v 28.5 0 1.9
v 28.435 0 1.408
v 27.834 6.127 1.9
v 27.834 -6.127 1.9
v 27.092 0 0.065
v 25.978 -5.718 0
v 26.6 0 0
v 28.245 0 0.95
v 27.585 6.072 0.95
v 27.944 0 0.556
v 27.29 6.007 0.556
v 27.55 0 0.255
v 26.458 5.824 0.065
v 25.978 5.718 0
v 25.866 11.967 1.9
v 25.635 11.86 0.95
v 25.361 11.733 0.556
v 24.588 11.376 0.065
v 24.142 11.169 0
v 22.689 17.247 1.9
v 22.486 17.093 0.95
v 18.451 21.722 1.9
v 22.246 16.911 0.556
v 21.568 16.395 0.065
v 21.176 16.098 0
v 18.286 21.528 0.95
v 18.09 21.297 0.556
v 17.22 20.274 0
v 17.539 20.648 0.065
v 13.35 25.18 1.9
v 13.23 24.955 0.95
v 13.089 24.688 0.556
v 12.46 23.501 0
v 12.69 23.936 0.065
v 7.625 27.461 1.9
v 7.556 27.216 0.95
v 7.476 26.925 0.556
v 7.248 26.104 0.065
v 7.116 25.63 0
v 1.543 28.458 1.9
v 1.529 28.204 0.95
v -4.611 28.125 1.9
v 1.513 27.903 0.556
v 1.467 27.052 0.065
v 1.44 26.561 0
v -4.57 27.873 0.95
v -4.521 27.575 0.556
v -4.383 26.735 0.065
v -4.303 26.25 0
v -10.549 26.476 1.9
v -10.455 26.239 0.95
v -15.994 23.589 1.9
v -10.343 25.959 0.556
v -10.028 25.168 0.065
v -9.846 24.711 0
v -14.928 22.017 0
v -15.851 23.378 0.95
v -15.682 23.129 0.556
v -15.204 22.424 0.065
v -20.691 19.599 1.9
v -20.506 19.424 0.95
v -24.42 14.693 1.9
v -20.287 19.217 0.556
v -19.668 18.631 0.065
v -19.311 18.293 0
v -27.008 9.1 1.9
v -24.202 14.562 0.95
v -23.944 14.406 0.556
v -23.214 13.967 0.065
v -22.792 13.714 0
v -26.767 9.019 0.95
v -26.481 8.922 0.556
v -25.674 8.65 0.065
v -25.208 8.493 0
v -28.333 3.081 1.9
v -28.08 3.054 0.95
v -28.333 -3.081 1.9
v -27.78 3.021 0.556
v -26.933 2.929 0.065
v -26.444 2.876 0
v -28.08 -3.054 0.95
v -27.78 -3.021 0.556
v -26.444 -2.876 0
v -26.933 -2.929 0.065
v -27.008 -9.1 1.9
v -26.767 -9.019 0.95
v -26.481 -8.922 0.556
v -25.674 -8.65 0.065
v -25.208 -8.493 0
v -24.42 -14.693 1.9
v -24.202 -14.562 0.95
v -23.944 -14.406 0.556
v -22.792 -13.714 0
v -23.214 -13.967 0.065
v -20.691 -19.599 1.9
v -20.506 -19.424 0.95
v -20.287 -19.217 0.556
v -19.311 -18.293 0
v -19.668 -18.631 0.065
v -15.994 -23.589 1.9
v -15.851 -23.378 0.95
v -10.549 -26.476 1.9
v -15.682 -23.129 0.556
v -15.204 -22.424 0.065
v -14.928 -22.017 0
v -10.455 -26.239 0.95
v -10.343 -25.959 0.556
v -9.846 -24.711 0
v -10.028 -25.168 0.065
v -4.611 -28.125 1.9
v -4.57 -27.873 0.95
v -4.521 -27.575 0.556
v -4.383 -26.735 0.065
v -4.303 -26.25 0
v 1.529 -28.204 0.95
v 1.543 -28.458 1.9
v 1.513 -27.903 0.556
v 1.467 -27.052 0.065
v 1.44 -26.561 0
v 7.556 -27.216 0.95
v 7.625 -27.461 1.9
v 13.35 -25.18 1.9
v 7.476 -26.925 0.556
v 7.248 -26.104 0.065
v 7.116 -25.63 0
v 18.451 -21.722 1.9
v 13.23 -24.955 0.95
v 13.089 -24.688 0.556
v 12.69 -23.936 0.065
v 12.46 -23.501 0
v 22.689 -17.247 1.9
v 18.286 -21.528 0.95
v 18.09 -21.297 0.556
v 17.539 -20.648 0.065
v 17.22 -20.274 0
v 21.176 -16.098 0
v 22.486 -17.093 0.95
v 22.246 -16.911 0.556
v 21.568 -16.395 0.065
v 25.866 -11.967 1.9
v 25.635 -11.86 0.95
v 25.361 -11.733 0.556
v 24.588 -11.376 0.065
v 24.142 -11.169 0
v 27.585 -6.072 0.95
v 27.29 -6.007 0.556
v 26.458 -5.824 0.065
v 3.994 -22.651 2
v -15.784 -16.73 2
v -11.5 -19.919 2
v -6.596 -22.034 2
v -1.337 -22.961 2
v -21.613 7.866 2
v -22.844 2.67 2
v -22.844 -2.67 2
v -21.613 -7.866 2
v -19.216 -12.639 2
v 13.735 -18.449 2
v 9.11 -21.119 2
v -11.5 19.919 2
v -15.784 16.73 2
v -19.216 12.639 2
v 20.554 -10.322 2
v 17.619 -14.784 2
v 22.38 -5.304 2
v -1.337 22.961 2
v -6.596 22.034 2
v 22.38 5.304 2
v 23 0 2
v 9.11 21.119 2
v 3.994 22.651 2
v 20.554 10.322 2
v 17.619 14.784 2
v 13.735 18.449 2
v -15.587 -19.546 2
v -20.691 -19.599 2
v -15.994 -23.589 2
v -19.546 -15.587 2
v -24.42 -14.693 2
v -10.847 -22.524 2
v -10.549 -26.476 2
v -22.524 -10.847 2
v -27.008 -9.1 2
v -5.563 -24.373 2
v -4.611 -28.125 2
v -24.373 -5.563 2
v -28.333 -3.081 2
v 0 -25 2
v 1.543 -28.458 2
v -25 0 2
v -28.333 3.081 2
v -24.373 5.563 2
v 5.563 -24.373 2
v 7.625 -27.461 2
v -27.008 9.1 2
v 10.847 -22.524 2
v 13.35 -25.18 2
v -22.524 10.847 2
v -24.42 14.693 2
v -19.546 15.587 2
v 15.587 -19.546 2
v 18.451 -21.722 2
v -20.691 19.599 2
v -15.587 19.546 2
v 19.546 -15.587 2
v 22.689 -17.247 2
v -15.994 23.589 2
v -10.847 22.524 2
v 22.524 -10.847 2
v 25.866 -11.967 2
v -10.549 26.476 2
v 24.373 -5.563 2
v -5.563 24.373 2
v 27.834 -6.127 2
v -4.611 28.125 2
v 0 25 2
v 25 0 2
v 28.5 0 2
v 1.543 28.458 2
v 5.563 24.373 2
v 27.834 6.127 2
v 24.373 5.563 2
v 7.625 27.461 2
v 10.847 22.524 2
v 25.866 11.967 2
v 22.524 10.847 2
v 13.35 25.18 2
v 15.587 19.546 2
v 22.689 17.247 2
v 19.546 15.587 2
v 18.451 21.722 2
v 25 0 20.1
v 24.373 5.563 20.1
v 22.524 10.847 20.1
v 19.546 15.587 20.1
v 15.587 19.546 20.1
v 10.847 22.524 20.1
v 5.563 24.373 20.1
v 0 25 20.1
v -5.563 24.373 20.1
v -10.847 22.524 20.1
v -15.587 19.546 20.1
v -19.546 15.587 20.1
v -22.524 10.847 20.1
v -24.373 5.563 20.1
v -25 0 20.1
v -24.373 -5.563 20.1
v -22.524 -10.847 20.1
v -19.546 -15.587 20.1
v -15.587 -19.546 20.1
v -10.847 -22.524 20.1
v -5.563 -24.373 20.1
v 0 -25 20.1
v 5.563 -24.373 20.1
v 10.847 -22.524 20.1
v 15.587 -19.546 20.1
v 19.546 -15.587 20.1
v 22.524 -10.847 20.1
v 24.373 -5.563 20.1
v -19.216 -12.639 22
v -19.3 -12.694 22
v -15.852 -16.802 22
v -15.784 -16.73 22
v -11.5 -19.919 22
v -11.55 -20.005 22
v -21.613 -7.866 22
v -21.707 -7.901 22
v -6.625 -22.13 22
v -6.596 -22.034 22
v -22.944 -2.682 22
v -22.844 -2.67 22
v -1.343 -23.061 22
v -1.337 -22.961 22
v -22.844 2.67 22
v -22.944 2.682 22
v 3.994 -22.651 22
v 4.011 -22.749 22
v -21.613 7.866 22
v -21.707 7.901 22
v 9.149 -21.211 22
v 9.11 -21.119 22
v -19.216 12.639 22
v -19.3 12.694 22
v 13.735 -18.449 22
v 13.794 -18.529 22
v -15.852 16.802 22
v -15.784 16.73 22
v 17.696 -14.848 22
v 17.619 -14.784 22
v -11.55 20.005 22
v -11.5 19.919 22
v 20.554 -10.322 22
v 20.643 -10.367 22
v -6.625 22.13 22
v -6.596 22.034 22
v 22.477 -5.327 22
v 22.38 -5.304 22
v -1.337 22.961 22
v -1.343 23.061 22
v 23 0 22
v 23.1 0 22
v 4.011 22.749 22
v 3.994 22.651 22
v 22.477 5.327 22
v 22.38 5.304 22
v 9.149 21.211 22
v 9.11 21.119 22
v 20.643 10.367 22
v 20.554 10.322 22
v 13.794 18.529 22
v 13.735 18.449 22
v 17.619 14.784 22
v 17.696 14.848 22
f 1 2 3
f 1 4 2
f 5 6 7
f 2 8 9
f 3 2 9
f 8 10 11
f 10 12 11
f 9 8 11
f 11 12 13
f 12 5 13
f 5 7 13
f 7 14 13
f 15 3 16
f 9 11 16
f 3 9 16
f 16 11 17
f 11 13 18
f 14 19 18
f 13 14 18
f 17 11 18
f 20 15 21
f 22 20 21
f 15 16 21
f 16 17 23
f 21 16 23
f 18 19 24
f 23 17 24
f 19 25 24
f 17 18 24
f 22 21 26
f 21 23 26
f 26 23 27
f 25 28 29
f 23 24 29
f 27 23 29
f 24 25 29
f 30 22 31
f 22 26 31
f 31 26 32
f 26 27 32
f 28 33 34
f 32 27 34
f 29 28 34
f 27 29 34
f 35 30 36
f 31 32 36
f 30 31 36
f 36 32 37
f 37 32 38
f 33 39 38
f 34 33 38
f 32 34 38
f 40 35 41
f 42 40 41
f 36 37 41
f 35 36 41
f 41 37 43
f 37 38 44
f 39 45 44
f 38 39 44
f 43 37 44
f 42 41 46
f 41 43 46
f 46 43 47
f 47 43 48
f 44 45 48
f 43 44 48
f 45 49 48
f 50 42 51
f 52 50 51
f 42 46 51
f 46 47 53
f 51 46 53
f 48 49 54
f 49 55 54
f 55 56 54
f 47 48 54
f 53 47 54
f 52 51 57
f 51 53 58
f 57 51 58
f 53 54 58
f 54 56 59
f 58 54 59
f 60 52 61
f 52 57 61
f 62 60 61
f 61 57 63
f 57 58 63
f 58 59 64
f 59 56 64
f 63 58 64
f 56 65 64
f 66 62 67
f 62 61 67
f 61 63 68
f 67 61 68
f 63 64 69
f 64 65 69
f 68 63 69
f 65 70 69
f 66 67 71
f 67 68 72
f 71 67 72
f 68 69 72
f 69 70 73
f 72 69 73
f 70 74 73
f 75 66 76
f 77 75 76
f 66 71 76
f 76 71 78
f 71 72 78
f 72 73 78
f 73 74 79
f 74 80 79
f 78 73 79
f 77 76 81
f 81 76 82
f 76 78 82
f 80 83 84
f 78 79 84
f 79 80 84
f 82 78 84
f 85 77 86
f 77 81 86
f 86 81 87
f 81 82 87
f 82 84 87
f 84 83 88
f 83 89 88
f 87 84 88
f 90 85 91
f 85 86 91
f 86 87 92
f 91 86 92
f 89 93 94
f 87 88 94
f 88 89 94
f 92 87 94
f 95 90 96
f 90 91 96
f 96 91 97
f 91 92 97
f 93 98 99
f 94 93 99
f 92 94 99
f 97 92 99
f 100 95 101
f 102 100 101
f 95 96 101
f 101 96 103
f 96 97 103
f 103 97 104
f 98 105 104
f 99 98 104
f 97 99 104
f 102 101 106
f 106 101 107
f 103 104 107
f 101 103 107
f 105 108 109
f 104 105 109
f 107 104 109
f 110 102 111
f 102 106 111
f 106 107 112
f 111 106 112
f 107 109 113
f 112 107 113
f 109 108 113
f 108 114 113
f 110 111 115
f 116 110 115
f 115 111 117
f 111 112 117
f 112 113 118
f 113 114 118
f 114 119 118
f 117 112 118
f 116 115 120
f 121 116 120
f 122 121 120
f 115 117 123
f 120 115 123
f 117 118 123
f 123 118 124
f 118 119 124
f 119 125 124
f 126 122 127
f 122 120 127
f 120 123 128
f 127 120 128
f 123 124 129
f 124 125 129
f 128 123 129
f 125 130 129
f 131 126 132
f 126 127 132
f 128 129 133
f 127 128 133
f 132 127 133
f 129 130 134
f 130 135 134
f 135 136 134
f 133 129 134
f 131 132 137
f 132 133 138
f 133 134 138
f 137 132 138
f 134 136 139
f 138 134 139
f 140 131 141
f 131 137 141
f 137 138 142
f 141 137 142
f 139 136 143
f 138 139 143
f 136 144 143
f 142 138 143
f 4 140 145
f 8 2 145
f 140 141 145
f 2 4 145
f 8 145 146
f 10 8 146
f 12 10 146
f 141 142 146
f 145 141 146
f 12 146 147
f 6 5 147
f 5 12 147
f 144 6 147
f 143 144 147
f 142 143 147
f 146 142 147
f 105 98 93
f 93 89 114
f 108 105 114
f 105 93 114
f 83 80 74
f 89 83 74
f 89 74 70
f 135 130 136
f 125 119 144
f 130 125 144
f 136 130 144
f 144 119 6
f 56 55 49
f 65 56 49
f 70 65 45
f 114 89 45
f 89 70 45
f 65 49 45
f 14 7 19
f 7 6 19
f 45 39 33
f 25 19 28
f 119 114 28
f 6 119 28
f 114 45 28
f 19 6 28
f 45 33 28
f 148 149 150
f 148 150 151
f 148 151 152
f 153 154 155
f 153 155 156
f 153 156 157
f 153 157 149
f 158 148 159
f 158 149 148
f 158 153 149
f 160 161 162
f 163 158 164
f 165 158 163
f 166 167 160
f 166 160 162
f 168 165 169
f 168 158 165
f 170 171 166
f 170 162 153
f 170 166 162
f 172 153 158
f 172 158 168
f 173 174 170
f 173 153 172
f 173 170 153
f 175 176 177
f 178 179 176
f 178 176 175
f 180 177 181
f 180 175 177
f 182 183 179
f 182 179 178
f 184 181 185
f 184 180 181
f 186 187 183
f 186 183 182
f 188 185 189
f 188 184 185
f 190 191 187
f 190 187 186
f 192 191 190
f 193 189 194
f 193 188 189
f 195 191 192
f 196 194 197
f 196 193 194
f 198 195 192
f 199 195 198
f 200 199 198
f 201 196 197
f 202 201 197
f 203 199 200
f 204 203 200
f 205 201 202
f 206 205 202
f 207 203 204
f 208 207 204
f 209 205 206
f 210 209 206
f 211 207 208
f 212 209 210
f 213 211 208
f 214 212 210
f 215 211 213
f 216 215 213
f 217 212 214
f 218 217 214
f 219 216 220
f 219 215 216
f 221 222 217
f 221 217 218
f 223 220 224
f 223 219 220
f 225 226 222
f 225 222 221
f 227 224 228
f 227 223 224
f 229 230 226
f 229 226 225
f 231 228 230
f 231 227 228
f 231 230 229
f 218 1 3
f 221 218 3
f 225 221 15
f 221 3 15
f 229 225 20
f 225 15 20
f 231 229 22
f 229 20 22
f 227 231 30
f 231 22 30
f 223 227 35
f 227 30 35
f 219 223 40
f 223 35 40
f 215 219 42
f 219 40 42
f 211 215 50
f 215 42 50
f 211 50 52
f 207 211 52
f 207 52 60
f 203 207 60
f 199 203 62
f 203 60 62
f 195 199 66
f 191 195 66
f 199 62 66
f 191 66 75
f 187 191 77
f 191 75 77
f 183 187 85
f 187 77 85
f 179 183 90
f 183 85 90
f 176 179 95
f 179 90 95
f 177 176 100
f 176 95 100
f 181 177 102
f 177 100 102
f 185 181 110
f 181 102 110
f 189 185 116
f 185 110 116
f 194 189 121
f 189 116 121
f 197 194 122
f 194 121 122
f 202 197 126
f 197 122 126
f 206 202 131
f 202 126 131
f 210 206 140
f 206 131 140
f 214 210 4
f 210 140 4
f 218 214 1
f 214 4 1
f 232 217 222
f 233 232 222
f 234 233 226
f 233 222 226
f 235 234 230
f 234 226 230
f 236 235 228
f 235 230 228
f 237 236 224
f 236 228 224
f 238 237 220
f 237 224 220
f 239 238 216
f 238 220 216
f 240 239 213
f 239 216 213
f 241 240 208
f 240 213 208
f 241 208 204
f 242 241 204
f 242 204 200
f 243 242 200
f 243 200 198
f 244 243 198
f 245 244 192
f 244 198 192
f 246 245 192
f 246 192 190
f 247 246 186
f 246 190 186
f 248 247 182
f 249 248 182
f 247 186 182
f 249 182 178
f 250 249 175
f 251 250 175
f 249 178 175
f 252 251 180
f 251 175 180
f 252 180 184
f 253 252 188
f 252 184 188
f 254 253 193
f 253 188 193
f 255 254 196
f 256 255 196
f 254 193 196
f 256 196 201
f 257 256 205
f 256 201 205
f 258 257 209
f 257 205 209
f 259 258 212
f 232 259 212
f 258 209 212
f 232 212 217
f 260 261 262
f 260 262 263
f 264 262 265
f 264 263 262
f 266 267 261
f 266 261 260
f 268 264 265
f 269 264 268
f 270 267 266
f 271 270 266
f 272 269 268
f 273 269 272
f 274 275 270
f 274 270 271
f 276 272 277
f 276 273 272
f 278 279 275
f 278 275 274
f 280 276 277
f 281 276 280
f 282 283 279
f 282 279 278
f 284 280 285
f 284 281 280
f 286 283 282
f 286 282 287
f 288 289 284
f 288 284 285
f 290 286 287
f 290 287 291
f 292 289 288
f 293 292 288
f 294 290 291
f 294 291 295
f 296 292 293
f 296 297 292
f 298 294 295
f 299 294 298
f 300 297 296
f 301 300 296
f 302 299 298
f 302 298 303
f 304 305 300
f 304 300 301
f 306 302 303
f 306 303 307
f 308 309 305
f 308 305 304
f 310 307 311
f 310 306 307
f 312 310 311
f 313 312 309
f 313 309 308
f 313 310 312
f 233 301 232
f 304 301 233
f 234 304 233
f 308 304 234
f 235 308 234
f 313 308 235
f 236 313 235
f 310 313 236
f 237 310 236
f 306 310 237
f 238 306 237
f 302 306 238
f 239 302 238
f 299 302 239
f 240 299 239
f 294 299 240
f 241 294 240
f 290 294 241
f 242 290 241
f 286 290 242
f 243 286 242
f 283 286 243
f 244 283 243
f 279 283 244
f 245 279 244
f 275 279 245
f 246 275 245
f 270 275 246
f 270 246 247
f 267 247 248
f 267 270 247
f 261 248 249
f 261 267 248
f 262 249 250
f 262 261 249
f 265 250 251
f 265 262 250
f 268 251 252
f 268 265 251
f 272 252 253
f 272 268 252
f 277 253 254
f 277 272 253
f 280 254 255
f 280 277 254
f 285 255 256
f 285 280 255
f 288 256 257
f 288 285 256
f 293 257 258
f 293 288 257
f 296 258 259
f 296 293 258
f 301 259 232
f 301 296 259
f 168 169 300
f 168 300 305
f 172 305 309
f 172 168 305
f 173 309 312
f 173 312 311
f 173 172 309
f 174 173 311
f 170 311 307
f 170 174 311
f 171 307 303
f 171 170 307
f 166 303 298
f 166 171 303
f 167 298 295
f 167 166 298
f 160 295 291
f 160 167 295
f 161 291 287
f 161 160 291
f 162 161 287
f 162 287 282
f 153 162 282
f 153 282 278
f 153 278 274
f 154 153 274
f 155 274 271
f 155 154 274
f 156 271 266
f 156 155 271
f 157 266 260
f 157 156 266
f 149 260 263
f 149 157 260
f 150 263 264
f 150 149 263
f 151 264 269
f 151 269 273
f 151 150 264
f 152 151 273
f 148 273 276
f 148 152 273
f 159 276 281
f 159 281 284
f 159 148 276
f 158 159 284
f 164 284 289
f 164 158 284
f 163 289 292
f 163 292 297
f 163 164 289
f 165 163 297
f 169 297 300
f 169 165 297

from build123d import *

# Parameters (mm, degrees)
SKETCH_R      = 28.5
PAD_DEPTH     = 2
SKETCH001_R   = 25
SKETCH001_R_2 = 23
PAD001_DEPTH  = 20
CHAMFER_SIZE  = 1.9
FILLET_R      = 1.9


with BuildPart() as part:
    # Sketch → Pad (new body)
    with BuildSketch(Plane.XY):
        Circle(SKETCH_R)
    extrude(amount=PAD_DEPTH)

    # Sketch001 (on Face3 of Pad) → Pad001 (join)
    with BuildSketch(Plane.XY.offset(2)):
        Circle(SKETCH001_R)
        Circle(SKETCH001_R_2, mode=Mode.SUBTRACT)
    extrude(amount=PAD001_DEPTH)

    # Chamfer
    chamfer_edges = [part.edges().sort_by_distance(p)[0] for p in [
        (-25, 0, 22),
    ]]
    chamfer(chamfer_edges, length=CHAMFER_SIZE)

    # Fillet
    fillet_edges = [part.edges().sort_by_distance(p)[0] for p in [
        (-28.5, 0, 0),
    ]]
    fillet(fillet_edges, radius=FILLET_R)


solid = part.part
